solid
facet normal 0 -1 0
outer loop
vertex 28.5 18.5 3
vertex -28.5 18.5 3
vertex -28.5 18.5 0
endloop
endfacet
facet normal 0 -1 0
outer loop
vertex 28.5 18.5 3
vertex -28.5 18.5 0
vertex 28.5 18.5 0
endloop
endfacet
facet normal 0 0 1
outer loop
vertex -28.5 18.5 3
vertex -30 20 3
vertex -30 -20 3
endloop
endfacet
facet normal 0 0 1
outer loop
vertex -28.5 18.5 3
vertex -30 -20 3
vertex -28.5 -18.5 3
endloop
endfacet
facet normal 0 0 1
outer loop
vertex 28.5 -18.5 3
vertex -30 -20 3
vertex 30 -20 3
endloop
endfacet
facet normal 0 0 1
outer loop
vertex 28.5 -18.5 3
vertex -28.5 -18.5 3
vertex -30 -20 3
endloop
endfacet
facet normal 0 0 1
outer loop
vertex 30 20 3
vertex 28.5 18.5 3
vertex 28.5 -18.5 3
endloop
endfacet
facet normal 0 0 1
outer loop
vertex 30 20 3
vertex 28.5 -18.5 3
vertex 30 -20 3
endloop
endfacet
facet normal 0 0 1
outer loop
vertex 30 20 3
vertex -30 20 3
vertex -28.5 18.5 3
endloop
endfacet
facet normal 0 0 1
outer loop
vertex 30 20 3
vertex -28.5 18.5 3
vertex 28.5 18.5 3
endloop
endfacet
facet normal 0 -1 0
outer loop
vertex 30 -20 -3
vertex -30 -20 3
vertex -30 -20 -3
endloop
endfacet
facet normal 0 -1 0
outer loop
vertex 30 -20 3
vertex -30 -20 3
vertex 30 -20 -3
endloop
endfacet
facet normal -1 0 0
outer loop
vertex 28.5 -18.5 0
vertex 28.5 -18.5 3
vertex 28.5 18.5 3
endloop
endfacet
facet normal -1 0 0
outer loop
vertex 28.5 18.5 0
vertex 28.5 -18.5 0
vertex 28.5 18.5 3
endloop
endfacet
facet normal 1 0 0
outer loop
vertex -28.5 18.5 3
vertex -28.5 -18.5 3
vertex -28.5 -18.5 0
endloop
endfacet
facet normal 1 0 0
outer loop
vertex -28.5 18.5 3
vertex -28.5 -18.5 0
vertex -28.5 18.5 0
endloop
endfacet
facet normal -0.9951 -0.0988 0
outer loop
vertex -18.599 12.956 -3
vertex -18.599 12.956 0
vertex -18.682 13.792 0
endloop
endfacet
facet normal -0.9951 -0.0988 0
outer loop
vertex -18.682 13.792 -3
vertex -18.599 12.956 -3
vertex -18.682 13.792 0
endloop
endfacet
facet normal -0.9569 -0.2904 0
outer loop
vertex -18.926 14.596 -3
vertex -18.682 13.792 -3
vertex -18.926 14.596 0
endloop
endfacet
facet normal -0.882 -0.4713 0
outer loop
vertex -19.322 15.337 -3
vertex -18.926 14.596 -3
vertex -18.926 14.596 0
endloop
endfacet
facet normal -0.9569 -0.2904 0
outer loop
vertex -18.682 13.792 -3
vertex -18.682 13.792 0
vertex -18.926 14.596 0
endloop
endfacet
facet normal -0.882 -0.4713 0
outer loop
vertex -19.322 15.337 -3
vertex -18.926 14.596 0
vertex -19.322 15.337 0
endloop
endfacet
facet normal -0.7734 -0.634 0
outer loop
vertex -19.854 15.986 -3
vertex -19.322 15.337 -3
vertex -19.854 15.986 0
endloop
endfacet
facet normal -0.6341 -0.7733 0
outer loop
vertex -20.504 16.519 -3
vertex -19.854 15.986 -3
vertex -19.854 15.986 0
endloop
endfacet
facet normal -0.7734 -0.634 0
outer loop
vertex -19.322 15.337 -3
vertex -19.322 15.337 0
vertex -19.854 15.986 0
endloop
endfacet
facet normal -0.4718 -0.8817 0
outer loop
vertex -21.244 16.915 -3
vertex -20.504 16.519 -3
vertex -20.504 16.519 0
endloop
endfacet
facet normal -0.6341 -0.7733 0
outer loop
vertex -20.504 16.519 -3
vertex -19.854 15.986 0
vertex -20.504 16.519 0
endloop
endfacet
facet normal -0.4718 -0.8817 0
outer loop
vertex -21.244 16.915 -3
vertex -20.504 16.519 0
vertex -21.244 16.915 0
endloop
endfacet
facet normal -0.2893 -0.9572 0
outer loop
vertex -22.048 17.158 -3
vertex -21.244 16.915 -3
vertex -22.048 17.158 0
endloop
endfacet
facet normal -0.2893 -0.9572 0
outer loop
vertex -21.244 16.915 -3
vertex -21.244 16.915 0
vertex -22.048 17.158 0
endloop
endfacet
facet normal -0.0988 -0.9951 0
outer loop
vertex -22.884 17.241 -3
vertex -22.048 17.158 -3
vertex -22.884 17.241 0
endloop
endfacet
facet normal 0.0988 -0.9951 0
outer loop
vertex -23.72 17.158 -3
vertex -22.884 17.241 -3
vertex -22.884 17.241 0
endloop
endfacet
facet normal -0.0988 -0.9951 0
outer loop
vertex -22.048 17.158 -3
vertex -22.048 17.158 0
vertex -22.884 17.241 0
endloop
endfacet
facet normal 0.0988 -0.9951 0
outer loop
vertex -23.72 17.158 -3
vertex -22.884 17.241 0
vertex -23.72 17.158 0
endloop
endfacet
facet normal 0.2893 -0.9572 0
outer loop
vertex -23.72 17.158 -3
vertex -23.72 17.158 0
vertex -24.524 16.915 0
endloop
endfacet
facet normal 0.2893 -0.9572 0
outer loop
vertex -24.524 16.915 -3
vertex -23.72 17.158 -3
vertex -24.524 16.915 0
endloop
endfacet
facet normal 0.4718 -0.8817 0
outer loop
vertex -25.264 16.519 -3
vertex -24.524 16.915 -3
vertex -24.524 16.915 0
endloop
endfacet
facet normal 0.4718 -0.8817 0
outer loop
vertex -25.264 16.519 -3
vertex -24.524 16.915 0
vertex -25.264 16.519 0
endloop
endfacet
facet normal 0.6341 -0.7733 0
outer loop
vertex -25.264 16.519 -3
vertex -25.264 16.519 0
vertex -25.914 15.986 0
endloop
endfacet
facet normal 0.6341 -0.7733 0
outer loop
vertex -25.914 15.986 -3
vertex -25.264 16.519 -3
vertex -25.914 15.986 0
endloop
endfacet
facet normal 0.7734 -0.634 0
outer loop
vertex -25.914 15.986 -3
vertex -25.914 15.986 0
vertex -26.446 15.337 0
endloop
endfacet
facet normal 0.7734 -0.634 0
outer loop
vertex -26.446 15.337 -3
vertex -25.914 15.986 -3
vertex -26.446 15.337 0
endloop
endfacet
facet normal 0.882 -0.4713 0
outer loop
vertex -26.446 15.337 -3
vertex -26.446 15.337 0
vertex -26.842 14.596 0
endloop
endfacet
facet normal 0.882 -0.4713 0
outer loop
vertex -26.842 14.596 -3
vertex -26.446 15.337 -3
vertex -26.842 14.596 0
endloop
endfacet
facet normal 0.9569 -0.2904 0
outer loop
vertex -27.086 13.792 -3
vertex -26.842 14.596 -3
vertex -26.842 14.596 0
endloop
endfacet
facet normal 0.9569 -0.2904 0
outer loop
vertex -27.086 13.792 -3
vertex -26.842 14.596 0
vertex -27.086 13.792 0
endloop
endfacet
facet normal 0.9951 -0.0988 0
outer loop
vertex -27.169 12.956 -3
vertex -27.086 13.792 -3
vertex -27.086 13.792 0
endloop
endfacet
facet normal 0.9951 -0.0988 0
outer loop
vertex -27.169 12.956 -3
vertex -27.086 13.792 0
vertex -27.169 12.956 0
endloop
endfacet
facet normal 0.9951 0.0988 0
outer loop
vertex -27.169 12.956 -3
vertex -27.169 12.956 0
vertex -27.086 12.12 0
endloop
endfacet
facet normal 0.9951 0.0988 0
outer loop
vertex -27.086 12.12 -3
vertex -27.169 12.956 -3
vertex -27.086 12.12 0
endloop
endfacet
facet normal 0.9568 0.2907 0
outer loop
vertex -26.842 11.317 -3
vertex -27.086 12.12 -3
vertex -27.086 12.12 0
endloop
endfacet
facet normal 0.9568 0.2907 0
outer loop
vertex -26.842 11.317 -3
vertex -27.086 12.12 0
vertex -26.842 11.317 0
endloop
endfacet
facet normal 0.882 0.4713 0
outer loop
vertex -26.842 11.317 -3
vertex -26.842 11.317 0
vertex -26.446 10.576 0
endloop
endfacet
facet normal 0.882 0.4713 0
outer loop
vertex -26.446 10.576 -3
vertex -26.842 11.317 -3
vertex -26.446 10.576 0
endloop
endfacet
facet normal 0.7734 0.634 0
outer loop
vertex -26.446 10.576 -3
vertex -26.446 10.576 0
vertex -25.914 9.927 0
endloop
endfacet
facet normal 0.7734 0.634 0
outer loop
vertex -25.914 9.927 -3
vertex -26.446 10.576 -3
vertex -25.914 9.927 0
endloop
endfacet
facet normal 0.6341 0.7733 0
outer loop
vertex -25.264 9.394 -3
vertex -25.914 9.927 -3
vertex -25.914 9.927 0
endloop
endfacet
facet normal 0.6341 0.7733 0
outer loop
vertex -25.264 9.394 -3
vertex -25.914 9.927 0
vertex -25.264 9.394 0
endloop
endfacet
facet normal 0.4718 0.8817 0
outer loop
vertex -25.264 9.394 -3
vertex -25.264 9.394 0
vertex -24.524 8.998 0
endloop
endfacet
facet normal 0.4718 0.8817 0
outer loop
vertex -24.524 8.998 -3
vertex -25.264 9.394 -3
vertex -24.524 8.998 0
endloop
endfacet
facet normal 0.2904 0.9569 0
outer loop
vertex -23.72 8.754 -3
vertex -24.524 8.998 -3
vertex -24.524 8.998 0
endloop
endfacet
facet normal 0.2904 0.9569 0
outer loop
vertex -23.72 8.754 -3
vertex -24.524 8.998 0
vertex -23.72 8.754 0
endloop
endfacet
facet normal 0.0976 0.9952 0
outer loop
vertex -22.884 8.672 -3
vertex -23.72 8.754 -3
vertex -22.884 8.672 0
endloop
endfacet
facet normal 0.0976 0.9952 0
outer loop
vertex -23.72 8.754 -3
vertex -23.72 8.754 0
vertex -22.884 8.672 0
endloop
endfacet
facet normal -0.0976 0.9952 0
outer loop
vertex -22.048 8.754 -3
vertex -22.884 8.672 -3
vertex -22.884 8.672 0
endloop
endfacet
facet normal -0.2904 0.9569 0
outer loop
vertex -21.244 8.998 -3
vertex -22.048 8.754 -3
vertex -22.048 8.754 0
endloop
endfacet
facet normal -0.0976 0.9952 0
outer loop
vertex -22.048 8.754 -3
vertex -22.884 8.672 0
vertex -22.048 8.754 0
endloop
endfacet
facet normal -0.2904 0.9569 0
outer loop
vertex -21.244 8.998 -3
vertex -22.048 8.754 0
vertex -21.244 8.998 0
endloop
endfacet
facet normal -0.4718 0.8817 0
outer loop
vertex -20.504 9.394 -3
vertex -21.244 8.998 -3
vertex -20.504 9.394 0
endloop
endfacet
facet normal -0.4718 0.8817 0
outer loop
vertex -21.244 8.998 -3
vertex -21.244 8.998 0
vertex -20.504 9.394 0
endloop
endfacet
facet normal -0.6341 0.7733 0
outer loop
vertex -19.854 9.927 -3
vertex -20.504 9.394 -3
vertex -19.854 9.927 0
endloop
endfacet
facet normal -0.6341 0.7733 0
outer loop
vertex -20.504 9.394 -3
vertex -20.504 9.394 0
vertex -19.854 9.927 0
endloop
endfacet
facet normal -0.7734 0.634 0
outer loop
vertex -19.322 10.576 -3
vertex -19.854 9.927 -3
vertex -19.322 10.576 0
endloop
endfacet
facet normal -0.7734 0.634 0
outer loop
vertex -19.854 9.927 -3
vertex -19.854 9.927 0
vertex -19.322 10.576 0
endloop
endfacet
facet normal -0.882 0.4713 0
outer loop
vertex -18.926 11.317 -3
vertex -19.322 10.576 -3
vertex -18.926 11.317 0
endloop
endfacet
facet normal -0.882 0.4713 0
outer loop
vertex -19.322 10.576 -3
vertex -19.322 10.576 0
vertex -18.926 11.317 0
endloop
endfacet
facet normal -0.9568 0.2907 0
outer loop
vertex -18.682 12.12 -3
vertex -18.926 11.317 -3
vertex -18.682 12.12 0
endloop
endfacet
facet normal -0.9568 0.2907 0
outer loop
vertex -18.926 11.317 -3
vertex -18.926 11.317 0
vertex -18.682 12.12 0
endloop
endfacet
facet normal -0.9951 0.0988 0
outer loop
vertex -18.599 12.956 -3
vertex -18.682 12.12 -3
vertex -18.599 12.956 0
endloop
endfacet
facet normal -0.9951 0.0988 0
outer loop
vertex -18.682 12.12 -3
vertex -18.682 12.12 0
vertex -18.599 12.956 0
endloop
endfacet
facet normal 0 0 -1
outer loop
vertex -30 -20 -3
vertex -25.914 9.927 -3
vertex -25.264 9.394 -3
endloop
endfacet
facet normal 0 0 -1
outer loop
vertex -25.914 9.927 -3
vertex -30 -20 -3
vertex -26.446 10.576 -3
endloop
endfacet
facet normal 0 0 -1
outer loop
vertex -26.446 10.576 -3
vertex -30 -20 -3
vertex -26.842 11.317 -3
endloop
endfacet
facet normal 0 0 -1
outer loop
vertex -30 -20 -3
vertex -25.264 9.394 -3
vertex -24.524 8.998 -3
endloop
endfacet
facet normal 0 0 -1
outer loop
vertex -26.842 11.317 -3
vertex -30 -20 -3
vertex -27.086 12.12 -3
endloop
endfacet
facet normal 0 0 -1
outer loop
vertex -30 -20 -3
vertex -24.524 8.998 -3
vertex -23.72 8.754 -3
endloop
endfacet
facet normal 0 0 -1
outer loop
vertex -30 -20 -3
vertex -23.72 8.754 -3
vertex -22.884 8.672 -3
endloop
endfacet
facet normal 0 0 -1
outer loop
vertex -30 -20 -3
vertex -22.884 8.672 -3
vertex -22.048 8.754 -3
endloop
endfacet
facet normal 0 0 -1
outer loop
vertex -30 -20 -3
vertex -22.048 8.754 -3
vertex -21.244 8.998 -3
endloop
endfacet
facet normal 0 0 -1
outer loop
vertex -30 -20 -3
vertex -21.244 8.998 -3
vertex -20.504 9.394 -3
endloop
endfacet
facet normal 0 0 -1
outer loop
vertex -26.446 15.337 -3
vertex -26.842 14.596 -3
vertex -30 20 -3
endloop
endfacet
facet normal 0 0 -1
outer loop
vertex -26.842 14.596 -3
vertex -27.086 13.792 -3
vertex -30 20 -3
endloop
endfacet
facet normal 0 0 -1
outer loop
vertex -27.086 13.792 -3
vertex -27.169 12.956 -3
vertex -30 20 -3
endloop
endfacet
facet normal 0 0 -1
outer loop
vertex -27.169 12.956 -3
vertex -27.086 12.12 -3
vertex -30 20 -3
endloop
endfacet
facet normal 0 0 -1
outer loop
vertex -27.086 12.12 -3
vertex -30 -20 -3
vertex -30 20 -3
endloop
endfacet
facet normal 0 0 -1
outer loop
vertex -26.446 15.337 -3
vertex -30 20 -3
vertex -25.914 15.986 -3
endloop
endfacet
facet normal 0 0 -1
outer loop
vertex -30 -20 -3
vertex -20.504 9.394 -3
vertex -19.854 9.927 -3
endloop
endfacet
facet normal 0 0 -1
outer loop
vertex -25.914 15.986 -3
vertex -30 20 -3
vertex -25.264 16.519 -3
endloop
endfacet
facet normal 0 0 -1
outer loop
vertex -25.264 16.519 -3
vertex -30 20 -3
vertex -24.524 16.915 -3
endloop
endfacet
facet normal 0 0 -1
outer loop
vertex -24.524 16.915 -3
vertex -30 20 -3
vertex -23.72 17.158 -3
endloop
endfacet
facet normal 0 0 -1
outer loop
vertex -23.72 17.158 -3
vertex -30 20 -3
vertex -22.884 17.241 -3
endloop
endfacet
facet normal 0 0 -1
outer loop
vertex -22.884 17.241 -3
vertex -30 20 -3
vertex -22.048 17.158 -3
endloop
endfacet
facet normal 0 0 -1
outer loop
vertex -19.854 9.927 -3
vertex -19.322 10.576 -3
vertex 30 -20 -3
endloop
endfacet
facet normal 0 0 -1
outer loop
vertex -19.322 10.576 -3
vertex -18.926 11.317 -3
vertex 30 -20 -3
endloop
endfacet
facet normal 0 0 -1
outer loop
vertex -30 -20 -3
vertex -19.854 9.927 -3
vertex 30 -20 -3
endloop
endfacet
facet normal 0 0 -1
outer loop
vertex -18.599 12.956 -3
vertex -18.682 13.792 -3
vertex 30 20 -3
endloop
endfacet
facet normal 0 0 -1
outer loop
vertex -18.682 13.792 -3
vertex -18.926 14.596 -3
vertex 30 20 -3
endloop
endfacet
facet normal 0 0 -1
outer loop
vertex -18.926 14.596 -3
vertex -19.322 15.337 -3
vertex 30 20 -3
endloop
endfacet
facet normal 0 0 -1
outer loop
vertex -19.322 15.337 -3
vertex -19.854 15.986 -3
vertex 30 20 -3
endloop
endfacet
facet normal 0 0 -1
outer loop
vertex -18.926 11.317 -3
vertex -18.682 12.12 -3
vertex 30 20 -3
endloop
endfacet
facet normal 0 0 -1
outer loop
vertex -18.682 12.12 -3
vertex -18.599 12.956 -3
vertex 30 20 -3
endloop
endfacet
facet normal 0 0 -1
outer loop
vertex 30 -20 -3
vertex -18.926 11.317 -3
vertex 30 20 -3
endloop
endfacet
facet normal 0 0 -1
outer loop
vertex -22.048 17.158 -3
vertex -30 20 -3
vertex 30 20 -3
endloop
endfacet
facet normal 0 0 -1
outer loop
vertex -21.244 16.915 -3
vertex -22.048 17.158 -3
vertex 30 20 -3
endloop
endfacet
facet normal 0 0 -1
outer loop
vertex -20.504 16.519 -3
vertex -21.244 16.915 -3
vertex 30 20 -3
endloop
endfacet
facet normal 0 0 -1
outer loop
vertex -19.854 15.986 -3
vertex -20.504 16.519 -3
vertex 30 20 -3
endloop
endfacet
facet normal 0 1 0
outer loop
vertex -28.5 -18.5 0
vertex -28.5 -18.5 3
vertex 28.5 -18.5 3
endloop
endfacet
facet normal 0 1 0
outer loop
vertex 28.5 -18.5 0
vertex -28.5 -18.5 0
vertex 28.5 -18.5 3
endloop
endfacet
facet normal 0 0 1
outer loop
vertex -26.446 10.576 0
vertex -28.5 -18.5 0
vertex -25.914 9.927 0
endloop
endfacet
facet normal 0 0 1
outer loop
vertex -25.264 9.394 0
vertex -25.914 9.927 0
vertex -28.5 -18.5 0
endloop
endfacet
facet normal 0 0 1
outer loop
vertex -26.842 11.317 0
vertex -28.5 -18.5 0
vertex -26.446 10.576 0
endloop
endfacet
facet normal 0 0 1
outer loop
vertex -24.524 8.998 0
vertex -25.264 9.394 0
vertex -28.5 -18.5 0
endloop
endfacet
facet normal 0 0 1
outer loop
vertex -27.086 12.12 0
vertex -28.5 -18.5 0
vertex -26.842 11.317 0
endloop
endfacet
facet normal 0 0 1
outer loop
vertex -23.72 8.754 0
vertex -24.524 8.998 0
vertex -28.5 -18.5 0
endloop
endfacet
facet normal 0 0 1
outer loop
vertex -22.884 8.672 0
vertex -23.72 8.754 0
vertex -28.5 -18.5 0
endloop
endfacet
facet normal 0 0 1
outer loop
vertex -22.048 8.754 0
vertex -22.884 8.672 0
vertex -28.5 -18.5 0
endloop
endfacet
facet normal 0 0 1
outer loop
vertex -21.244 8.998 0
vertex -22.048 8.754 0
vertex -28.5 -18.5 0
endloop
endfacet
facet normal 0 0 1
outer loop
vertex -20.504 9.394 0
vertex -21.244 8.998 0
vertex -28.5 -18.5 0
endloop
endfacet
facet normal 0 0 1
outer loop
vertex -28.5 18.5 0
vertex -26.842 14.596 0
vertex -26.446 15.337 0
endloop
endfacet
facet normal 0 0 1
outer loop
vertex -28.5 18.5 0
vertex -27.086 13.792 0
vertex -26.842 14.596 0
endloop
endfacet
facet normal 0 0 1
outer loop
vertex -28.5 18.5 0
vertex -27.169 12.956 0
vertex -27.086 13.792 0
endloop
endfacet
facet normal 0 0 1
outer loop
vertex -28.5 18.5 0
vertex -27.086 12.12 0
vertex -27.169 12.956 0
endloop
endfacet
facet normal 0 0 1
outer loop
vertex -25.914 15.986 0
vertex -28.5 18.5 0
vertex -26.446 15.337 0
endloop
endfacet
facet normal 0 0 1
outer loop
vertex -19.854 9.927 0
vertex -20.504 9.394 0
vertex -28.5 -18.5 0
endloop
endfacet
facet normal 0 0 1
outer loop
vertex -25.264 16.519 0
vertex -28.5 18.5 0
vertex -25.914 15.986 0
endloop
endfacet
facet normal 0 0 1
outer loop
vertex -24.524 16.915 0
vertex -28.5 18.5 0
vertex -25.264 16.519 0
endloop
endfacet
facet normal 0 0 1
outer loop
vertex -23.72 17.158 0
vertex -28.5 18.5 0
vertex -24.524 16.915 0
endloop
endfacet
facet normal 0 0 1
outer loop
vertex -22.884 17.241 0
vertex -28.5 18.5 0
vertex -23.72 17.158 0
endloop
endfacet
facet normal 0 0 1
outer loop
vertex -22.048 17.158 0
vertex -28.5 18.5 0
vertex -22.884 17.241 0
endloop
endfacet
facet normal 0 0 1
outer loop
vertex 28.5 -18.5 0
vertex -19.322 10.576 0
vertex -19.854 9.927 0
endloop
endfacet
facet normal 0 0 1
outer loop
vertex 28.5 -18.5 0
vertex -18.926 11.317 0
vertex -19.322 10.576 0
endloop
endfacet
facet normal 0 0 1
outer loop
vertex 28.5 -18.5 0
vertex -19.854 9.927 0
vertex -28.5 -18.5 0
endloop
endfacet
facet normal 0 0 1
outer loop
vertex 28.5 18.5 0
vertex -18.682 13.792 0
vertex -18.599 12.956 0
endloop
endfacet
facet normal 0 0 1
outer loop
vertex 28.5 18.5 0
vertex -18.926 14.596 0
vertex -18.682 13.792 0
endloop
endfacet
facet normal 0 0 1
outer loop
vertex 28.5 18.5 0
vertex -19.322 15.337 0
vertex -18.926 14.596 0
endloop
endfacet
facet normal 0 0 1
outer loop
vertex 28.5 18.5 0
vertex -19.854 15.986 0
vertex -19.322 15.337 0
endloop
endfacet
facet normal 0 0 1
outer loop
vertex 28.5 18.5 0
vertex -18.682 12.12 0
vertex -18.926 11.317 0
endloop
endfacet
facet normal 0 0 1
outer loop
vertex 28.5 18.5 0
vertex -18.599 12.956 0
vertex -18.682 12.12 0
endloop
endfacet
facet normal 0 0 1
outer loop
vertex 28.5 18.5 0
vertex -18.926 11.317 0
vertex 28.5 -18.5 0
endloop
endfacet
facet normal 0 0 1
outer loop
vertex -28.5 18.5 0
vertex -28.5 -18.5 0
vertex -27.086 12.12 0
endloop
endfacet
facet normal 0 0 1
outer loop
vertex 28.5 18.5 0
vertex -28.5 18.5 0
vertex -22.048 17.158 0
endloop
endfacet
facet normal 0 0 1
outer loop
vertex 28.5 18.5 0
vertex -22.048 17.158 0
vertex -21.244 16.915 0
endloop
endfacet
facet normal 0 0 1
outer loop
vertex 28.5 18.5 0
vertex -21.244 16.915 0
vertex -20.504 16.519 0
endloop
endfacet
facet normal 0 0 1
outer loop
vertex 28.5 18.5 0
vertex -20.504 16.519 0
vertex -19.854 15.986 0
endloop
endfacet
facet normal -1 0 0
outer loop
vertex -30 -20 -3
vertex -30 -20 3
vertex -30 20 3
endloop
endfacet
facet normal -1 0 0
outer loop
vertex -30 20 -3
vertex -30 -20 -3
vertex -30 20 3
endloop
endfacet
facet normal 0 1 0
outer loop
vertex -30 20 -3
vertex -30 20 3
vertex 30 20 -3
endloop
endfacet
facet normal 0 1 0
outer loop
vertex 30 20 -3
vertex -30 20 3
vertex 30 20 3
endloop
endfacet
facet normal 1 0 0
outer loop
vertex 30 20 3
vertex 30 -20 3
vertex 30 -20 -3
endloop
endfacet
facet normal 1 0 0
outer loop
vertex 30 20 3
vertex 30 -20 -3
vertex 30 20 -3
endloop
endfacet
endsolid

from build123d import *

# Parameters (mm, degrees)
F0_W     = 60
F0_H     = 40
F1_DEPTH = 3
F2_W     = 57
F2_H     = 37
F3_DEPTH = 3
F6_R     = 4.2845281604
F7_DEPTH = 6


# Not quite as in the source:
# - the program builds the solid bodies; features that only make, move or delete a surface that nothing else refers to are left out


with BuildPart() as f1:
    # F0 (on Top) → F1 (new body, symmetric)
    with BuildSketch(Plane.XY):
        Rectangle(F0_W, F0_H)
    extrude(amount=F1_DEPTH, both=True)

    # F2 (on face) → F3 (cut)
    with BuildSketch(Plane.XY.offset(3)):
        Rectangle(F2_W, F2_H)
    extrude(amount=-F3_DEPTH, mode=Mode.SUBTRACT)

    # F6 (on face) → F7 (cut)
    with BuildSketch(Plane.XY):
        with Locations((-22.8839740157, 12.9562756047)):
            Circle(F6_R)
    extrude(amount=-F7_DEPTH, mode=Mode.SUBTRACT)


solid = f1.part
